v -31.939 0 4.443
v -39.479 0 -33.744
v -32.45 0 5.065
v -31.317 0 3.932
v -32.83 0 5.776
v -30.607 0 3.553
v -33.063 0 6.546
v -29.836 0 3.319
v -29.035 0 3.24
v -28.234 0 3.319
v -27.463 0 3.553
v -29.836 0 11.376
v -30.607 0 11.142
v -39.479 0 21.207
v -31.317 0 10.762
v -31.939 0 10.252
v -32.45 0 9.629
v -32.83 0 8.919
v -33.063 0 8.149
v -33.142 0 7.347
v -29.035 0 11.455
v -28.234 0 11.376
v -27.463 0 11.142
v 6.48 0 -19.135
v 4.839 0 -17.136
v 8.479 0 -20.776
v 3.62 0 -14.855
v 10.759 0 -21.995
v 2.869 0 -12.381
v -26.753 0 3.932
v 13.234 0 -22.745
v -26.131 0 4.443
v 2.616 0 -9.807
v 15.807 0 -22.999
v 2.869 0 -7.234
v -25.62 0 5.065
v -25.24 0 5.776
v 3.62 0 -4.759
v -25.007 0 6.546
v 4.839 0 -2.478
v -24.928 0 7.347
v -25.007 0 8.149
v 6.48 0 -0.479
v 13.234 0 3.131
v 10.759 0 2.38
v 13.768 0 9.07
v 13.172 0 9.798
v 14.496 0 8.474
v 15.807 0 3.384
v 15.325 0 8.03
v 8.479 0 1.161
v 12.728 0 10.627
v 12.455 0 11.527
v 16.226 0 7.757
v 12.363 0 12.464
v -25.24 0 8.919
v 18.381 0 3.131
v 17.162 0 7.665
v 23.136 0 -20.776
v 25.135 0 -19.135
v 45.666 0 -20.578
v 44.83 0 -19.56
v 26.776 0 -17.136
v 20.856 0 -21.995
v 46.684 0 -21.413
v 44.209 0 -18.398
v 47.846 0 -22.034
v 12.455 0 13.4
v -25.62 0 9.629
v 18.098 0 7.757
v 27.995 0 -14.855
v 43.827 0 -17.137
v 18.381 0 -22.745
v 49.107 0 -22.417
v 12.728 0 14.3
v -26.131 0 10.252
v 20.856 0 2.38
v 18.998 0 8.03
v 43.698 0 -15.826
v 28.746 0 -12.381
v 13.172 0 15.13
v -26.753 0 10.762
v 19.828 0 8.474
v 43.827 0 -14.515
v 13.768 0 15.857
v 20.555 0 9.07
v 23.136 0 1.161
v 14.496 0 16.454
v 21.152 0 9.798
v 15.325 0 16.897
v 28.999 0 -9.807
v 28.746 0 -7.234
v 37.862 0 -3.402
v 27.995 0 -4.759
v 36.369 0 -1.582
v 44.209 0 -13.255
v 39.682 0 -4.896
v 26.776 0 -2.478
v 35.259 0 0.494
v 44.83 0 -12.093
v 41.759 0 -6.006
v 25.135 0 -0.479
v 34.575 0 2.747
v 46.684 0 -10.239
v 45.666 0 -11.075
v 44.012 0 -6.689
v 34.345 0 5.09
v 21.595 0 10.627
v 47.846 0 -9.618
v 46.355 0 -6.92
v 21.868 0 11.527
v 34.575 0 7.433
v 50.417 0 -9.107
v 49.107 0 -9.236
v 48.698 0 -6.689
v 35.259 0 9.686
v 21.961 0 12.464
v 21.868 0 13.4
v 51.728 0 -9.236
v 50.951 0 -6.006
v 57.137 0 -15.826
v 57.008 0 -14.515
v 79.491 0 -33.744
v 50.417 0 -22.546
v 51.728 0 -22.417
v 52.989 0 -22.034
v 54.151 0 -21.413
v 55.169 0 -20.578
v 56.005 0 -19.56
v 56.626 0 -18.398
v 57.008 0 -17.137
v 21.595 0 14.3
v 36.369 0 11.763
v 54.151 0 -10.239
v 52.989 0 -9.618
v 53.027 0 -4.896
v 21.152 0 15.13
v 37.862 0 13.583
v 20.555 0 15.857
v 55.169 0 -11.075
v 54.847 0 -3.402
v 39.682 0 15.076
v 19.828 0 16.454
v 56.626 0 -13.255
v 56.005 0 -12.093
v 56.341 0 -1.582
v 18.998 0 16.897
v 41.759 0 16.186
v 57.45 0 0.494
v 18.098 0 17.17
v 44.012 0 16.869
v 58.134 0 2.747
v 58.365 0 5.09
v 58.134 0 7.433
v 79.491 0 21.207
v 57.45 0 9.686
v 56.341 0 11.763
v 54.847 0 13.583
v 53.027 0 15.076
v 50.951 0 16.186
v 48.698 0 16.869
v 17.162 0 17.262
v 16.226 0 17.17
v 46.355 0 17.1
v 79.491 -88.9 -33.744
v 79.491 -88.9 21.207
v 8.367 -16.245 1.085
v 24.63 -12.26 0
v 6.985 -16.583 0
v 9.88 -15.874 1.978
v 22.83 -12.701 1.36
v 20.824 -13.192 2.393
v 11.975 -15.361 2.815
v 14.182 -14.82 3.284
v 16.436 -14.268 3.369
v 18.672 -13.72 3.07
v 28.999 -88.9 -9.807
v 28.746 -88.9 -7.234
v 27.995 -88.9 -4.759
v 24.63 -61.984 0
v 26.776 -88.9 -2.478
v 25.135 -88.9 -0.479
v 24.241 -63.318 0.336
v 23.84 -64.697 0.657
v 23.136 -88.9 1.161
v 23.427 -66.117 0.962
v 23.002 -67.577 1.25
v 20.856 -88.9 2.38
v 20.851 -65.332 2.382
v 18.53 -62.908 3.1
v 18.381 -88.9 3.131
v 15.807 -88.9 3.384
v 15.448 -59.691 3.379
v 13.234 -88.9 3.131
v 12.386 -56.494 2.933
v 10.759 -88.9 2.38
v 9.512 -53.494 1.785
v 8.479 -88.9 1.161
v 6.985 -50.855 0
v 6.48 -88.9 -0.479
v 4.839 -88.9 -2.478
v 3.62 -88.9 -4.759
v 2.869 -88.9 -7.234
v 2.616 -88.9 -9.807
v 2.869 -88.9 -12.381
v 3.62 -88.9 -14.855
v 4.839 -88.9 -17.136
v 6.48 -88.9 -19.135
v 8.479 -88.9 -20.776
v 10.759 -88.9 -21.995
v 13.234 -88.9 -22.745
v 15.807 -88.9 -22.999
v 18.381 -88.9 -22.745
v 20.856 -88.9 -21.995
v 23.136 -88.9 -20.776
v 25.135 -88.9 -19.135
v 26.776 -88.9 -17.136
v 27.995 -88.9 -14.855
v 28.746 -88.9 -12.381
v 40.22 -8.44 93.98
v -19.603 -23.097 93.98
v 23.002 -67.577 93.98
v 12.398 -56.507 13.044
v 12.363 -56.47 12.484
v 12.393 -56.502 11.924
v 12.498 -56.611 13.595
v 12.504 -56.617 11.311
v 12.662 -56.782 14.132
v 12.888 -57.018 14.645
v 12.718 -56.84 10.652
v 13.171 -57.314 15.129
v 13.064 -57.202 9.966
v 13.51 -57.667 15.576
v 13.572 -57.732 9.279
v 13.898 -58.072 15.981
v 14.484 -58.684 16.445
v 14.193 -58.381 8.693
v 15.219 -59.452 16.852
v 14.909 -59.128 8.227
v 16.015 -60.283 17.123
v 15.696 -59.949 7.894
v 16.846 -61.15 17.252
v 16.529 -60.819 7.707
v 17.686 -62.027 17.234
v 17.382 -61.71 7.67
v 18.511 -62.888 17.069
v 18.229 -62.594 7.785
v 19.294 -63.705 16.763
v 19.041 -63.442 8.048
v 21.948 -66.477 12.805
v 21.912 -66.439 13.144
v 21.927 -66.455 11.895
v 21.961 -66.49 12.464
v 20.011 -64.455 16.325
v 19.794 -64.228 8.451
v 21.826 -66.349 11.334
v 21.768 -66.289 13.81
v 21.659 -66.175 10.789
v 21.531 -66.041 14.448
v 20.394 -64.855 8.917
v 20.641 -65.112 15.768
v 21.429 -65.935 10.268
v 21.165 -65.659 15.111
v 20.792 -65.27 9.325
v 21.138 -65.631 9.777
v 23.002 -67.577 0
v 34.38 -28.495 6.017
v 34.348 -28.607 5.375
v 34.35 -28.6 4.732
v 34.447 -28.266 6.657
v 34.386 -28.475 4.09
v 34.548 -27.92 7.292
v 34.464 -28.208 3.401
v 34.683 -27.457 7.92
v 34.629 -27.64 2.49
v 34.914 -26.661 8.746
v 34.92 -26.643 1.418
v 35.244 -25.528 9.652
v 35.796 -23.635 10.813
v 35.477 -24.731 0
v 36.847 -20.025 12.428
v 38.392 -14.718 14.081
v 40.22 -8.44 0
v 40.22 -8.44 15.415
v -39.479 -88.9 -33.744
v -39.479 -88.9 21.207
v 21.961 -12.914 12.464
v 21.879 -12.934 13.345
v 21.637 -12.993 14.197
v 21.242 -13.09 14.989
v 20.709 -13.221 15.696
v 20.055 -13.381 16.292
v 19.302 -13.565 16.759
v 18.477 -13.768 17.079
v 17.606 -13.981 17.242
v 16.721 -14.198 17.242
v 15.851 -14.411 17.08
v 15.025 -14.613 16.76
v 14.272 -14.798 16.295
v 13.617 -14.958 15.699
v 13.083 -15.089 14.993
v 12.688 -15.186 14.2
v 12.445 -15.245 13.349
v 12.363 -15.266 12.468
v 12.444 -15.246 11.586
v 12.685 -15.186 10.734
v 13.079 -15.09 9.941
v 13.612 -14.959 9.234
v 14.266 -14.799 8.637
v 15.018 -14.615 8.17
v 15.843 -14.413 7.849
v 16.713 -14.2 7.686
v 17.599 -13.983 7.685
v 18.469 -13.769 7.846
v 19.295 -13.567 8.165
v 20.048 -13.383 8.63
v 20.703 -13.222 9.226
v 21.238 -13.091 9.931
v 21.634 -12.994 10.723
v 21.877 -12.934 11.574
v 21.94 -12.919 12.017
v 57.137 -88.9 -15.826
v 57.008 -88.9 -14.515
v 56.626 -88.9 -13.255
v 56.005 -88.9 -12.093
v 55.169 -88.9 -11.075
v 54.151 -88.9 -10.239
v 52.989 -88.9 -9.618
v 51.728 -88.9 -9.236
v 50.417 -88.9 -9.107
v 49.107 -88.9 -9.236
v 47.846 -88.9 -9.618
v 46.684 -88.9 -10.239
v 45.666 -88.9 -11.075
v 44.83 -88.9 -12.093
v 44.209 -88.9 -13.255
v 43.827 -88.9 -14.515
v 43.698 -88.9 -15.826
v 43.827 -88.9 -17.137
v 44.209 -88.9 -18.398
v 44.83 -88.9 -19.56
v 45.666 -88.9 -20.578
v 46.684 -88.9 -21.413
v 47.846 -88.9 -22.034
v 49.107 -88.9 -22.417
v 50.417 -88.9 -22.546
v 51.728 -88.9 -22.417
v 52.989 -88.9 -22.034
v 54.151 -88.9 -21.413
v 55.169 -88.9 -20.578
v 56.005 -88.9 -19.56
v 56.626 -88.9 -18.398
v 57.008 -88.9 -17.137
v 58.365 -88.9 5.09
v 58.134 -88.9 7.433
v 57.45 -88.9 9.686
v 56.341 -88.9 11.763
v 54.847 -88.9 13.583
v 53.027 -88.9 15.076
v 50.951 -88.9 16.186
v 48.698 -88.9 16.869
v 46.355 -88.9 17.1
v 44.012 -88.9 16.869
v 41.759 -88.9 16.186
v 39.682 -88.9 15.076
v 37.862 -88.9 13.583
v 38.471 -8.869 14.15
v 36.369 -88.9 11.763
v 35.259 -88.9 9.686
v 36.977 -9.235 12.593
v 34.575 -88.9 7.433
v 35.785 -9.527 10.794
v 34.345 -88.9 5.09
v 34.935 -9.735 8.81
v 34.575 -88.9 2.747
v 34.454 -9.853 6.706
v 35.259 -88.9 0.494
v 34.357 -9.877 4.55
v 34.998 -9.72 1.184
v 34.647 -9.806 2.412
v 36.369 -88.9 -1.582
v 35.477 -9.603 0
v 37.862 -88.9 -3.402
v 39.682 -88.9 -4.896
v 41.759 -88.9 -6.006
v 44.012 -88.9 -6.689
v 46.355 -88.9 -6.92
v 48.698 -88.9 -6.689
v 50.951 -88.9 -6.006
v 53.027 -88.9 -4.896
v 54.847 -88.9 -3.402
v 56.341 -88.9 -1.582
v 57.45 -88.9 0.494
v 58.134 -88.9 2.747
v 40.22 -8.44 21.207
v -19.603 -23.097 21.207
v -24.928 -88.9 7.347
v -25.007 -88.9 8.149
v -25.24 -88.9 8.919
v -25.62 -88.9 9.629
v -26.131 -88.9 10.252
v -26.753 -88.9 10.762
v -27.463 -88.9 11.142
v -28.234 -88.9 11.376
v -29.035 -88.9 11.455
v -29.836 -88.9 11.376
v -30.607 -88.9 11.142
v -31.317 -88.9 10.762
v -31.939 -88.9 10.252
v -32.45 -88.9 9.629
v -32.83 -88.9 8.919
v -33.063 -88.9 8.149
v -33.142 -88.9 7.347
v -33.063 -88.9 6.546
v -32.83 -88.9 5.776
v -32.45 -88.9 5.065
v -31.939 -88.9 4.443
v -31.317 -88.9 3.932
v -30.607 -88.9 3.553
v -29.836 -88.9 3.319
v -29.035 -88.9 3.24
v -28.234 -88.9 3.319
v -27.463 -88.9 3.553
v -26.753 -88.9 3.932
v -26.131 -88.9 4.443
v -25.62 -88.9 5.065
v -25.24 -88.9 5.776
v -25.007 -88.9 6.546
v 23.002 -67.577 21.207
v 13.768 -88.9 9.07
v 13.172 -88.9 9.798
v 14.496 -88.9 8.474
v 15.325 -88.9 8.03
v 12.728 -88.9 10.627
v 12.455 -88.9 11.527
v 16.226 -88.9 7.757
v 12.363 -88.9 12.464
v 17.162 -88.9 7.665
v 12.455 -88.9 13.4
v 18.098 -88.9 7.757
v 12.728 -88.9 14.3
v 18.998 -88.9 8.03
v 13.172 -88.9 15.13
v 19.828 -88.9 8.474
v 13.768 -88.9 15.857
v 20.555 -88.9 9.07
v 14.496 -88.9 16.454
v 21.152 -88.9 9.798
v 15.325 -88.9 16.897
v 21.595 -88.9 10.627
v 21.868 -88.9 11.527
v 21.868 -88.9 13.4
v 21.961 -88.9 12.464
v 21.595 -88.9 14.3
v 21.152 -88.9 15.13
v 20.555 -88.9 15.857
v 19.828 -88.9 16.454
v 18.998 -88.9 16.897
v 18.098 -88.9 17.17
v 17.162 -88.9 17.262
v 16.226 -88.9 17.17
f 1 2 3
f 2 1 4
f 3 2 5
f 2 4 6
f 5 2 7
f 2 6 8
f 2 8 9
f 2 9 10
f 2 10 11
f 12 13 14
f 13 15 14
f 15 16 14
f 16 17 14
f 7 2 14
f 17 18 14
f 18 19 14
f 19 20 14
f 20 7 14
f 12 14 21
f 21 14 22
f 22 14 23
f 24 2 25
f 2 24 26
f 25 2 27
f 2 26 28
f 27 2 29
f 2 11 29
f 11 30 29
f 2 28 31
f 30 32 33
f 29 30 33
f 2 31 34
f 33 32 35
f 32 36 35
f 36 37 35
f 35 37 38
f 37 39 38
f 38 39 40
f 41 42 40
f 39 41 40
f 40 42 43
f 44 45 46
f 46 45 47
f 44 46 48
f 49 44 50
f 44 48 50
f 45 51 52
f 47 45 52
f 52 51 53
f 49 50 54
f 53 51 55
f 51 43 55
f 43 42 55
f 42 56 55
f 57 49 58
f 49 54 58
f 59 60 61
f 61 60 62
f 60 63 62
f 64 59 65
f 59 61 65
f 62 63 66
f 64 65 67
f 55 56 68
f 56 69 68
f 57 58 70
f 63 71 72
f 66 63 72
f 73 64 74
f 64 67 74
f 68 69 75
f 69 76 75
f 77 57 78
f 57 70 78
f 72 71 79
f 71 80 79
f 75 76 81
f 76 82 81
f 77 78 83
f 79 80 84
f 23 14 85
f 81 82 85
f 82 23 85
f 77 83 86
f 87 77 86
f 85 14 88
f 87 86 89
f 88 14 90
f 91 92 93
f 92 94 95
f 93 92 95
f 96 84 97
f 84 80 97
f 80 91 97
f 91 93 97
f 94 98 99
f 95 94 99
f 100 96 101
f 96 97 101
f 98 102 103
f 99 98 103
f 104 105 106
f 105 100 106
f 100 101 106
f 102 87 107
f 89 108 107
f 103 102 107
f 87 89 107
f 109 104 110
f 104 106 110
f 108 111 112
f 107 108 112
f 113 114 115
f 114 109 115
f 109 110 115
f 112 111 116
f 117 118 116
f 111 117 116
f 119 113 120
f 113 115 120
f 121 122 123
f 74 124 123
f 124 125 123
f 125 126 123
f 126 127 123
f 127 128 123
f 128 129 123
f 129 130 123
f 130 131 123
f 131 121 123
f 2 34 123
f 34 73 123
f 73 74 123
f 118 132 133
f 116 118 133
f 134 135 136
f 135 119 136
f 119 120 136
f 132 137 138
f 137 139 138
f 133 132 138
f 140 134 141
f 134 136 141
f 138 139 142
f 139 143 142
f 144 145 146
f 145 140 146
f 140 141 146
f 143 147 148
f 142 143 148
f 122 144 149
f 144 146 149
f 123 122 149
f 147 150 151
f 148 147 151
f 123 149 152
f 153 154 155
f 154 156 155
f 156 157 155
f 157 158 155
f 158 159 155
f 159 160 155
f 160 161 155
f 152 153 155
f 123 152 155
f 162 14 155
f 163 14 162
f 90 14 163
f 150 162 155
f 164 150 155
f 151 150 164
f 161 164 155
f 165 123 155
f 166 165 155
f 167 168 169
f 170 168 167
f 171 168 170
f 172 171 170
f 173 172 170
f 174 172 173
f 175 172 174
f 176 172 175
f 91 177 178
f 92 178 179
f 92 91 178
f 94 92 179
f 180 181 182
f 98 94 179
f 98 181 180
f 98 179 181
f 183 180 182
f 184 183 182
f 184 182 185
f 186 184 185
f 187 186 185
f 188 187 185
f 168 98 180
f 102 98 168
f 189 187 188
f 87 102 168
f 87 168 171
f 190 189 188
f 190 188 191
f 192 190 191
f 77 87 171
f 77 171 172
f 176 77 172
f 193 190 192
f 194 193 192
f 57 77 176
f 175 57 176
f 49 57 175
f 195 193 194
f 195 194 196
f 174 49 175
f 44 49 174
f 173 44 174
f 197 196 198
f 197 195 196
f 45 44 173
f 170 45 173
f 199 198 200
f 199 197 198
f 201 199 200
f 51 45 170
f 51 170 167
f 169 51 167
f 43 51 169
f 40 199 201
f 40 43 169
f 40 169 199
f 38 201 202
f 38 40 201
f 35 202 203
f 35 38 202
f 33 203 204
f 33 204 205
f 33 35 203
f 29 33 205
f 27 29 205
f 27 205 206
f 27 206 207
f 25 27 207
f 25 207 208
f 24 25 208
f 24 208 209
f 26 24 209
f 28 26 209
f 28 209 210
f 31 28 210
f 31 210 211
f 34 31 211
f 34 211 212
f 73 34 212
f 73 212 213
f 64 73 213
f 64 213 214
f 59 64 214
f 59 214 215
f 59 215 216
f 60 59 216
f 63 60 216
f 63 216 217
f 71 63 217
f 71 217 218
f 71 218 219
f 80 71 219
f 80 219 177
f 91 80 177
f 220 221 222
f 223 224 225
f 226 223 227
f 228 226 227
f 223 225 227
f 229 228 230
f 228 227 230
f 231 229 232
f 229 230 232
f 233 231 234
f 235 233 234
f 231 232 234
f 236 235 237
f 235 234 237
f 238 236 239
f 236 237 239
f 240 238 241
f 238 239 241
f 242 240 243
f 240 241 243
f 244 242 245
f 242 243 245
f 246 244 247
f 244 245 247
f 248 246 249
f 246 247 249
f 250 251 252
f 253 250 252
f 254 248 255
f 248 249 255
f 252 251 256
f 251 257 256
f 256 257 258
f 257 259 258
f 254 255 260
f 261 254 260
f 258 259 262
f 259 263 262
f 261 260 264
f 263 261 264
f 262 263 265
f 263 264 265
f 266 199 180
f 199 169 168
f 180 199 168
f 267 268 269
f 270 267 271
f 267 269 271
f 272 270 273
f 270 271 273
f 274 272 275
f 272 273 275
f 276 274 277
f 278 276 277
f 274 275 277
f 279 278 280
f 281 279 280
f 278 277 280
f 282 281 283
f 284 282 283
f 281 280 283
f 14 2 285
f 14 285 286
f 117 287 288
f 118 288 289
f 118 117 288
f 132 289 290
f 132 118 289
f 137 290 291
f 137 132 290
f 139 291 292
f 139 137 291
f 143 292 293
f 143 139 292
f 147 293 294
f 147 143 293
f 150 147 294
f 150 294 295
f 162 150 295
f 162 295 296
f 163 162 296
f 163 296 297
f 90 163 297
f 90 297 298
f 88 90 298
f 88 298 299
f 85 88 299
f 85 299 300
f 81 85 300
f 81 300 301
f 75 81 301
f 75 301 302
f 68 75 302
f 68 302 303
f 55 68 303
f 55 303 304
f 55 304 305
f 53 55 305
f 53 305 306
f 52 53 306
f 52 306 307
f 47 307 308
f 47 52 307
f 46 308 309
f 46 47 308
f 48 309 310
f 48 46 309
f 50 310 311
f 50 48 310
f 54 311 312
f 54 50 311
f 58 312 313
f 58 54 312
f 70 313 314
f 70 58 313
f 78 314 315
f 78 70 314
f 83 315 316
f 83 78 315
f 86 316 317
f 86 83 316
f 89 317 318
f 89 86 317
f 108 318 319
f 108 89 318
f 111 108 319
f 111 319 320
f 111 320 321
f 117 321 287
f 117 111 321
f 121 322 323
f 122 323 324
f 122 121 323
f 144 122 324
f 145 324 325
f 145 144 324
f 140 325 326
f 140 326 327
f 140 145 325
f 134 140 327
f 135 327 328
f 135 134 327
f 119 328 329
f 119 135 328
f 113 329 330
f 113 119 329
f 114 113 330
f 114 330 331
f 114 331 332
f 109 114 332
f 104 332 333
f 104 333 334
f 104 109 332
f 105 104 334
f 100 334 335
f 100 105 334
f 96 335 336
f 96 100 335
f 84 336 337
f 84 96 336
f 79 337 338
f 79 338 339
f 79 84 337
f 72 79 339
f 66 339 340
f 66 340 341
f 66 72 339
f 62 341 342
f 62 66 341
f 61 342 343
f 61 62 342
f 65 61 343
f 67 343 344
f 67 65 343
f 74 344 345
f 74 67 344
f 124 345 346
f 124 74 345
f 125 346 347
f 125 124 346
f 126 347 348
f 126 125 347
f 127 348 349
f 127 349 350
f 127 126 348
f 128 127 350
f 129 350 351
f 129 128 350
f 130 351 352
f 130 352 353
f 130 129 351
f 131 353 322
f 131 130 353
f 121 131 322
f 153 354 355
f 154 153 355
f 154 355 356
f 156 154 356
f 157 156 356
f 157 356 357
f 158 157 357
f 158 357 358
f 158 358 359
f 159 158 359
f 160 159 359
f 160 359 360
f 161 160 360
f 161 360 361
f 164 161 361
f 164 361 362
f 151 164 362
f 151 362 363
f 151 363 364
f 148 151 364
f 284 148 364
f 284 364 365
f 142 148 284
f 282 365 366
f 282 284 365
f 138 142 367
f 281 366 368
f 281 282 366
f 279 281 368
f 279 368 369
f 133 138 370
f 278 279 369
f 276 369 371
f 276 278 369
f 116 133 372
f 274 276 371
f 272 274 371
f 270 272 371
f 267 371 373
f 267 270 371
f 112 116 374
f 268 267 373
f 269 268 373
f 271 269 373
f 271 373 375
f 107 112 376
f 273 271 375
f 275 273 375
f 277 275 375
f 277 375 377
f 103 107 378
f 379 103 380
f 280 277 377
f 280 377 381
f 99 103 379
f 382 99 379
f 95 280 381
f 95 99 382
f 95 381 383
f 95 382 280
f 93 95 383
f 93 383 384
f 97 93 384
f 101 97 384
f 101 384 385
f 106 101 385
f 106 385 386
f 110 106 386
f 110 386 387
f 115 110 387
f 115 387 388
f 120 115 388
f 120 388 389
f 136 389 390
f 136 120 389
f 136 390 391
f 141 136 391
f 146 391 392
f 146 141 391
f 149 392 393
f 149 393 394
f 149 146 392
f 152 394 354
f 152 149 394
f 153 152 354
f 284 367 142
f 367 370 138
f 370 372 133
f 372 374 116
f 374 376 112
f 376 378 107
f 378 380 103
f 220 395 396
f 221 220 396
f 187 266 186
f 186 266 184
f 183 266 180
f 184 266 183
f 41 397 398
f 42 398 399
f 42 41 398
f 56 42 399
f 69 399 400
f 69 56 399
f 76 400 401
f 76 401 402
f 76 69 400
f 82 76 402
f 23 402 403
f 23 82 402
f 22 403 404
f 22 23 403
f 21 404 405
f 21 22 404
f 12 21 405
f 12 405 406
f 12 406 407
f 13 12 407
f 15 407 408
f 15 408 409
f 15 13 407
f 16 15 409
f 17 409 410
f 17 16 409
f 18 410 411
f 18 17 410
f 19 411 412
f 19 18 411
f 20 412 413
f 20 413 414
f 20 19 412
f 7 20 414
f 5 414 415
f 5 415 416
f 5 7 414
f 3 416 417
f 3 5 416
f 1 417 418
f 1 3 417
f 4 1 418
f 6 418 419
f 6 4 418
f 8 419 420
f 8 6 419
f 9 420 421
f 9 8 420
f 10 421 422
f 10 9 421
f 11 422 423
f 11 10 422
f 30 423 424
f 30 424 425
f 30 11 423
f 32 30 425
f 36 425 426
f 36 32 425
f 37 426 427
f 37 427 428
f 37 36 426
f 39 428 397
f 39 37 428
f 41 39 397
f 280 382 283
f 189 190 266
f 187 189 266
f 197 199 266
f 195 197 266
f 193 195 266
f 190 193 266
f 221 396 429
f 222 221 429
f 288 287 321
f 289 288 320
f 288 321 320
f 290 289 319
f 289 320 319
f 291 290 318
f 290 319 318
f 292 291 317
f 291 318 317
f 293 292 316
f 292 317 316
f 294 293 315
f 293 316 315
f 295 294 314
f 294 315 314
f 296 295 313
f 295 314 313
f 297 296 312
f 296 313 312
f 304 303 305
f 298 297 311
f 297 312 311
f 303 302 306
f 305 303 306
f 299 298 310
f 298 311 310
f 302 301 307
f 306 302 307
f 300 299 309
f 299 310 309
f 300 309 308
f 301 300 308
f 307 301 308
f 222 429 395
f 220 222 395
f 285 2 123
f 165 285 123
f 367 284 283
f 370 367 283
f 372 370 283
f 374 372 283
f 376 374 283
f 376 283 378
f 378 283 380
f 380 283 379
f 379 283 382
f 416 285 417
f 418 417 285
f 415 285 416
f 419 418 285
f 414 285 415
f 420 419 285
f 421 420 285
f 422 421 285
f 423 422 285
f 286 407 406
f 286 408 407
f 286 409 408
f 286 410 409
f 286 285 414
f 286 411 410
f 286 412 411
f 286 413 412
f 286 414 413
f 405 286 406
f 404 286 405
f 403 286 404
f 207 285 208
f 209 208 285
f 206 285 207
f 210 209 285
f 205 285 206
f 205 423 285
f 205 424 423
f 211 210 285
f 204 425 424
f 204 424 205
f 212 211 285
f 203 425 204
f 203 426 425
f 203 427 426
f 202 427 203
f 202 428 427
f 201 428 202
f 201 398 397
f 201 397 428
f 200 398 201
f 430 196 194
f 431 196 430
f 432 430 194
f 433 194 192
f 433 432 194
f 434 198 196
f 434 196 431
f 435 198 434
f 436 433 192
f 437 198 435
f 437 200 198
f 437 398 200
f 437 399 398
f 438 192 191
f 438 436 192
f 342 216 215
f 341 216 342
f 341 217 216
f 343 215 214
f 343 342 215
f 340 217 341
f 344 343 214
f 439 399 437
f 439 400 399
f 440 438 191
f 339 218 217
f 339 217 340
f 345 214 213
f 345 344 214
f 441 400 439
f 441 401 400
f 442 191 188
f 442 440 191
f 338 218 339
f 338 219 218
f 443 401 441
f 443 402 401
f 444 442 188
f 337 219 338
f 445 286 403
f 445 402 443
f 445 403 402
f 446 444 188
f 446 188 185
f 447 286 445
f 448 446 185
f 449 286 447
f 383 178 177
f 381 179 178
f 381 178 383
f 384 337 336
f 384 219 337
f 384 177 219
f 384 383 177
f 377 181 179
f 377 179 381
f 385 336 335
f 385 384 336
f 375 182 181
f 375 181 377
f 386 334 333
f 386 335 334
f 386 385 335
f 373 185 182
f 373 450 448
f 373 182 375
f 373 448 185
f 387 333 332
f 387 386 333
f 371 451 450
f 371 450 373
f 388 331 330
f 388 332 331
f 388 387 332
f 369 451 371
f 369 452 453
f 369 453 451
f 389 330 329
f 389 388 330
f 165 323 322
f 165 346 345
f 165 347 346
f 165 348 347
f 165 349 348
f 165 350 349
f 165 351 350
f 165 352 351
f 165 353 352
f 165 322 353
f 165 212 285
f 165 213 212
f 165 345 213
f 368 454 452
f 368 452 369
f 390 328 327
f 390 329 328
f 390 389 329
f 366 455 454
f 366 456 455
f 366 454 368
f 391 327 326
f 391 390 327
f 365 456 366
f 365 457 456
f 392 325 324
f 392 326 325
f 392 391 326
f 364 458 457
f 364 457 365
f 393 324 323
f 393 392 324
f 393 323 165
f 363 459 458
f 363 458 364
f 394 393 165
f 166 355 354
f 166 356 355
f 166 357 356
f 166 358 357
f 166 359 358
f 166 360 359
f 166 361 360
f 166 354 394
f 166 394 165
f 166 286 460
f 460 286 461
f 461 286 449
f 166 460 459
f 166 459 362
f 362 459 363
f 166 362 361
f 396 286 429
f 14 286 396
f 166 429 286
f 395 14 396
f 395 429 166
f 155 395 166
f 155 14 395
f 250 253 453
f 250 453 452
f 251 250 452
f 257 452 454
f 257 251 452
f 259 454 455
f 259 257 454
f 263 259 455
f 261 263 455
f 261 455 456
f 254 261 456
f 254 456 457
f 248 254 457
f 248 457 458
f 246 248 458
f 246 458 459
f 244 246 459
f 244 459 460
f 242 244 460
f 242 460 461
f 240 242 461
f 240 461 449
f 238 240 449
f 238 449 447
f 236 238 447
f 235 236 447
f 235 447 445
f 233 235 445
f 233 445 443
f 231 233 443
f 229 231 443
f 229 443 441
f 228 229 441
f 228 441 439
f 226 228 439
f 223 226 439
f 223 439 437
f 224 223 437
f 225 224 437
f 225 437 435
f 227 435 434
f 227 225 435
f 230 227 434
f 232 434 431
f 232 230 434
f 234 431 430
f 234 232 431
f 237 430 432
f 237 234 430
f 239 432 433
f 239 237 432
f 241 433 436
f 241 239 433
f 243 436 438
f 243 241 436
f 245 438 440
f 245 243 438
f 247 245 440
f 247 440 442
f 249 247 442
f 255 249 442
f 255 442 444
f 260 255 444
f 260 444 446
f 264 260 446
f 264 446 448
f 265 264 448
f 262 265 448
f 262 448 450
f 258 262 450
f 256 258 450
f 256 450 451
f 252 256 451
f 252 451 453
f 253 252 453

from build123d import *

# Parameters (mm, degrees)
F0_W     = 118.970122
F0_H     = 54.950323
F0_R     = 13.191556
F0_R_2   = 6.719496
F0_R_3   = 4.107262
F0_R_4   = 4.798819
F0_R_5   = 12.010022
F1_DEPTH = 88.9
F3_DEPTH = 93.98


with BuildPart() as f1:
    # F0 (on Front) → F1 (new body)
    with BuildSketch(Plane.XZ):
        with Locations((20.006189, -6.268603)):
            Rectangle(F0_W, F0_H)
        with Locations((15.80747, -9.807219)):
            Circle(F0_R, mode=Mode.SUBTRACT)
        with Locations((50.417498, -15.826354)):
            Circle(F0_R_2, mode=Mode.SUBTRACT)
        with Locations((-29.035088, 7.347315)):
            Circle(F0_R_3, mode=Mode.SUBTRACT)
        with Locations((17.161777, 12.463582)):
            Circle(F0_R_4, mode=Mode.SUBTRACT)
        with Locations((46.354581, 5.09014)):
            Circle(F0_R_5, mode=Mode.SUBTRACT)
    extrude(amount=F1_DEPTH)

    # F2 (on Top) → F3 (join)
    with BuildSketch(Plane.XY):
        Polygon((23.00154, -67.576603), (40.219564, -8.440484), (-19.602828, -23.097298), align=None)
    extrude(amount=F3_DEPTH)


solid = f1.part
